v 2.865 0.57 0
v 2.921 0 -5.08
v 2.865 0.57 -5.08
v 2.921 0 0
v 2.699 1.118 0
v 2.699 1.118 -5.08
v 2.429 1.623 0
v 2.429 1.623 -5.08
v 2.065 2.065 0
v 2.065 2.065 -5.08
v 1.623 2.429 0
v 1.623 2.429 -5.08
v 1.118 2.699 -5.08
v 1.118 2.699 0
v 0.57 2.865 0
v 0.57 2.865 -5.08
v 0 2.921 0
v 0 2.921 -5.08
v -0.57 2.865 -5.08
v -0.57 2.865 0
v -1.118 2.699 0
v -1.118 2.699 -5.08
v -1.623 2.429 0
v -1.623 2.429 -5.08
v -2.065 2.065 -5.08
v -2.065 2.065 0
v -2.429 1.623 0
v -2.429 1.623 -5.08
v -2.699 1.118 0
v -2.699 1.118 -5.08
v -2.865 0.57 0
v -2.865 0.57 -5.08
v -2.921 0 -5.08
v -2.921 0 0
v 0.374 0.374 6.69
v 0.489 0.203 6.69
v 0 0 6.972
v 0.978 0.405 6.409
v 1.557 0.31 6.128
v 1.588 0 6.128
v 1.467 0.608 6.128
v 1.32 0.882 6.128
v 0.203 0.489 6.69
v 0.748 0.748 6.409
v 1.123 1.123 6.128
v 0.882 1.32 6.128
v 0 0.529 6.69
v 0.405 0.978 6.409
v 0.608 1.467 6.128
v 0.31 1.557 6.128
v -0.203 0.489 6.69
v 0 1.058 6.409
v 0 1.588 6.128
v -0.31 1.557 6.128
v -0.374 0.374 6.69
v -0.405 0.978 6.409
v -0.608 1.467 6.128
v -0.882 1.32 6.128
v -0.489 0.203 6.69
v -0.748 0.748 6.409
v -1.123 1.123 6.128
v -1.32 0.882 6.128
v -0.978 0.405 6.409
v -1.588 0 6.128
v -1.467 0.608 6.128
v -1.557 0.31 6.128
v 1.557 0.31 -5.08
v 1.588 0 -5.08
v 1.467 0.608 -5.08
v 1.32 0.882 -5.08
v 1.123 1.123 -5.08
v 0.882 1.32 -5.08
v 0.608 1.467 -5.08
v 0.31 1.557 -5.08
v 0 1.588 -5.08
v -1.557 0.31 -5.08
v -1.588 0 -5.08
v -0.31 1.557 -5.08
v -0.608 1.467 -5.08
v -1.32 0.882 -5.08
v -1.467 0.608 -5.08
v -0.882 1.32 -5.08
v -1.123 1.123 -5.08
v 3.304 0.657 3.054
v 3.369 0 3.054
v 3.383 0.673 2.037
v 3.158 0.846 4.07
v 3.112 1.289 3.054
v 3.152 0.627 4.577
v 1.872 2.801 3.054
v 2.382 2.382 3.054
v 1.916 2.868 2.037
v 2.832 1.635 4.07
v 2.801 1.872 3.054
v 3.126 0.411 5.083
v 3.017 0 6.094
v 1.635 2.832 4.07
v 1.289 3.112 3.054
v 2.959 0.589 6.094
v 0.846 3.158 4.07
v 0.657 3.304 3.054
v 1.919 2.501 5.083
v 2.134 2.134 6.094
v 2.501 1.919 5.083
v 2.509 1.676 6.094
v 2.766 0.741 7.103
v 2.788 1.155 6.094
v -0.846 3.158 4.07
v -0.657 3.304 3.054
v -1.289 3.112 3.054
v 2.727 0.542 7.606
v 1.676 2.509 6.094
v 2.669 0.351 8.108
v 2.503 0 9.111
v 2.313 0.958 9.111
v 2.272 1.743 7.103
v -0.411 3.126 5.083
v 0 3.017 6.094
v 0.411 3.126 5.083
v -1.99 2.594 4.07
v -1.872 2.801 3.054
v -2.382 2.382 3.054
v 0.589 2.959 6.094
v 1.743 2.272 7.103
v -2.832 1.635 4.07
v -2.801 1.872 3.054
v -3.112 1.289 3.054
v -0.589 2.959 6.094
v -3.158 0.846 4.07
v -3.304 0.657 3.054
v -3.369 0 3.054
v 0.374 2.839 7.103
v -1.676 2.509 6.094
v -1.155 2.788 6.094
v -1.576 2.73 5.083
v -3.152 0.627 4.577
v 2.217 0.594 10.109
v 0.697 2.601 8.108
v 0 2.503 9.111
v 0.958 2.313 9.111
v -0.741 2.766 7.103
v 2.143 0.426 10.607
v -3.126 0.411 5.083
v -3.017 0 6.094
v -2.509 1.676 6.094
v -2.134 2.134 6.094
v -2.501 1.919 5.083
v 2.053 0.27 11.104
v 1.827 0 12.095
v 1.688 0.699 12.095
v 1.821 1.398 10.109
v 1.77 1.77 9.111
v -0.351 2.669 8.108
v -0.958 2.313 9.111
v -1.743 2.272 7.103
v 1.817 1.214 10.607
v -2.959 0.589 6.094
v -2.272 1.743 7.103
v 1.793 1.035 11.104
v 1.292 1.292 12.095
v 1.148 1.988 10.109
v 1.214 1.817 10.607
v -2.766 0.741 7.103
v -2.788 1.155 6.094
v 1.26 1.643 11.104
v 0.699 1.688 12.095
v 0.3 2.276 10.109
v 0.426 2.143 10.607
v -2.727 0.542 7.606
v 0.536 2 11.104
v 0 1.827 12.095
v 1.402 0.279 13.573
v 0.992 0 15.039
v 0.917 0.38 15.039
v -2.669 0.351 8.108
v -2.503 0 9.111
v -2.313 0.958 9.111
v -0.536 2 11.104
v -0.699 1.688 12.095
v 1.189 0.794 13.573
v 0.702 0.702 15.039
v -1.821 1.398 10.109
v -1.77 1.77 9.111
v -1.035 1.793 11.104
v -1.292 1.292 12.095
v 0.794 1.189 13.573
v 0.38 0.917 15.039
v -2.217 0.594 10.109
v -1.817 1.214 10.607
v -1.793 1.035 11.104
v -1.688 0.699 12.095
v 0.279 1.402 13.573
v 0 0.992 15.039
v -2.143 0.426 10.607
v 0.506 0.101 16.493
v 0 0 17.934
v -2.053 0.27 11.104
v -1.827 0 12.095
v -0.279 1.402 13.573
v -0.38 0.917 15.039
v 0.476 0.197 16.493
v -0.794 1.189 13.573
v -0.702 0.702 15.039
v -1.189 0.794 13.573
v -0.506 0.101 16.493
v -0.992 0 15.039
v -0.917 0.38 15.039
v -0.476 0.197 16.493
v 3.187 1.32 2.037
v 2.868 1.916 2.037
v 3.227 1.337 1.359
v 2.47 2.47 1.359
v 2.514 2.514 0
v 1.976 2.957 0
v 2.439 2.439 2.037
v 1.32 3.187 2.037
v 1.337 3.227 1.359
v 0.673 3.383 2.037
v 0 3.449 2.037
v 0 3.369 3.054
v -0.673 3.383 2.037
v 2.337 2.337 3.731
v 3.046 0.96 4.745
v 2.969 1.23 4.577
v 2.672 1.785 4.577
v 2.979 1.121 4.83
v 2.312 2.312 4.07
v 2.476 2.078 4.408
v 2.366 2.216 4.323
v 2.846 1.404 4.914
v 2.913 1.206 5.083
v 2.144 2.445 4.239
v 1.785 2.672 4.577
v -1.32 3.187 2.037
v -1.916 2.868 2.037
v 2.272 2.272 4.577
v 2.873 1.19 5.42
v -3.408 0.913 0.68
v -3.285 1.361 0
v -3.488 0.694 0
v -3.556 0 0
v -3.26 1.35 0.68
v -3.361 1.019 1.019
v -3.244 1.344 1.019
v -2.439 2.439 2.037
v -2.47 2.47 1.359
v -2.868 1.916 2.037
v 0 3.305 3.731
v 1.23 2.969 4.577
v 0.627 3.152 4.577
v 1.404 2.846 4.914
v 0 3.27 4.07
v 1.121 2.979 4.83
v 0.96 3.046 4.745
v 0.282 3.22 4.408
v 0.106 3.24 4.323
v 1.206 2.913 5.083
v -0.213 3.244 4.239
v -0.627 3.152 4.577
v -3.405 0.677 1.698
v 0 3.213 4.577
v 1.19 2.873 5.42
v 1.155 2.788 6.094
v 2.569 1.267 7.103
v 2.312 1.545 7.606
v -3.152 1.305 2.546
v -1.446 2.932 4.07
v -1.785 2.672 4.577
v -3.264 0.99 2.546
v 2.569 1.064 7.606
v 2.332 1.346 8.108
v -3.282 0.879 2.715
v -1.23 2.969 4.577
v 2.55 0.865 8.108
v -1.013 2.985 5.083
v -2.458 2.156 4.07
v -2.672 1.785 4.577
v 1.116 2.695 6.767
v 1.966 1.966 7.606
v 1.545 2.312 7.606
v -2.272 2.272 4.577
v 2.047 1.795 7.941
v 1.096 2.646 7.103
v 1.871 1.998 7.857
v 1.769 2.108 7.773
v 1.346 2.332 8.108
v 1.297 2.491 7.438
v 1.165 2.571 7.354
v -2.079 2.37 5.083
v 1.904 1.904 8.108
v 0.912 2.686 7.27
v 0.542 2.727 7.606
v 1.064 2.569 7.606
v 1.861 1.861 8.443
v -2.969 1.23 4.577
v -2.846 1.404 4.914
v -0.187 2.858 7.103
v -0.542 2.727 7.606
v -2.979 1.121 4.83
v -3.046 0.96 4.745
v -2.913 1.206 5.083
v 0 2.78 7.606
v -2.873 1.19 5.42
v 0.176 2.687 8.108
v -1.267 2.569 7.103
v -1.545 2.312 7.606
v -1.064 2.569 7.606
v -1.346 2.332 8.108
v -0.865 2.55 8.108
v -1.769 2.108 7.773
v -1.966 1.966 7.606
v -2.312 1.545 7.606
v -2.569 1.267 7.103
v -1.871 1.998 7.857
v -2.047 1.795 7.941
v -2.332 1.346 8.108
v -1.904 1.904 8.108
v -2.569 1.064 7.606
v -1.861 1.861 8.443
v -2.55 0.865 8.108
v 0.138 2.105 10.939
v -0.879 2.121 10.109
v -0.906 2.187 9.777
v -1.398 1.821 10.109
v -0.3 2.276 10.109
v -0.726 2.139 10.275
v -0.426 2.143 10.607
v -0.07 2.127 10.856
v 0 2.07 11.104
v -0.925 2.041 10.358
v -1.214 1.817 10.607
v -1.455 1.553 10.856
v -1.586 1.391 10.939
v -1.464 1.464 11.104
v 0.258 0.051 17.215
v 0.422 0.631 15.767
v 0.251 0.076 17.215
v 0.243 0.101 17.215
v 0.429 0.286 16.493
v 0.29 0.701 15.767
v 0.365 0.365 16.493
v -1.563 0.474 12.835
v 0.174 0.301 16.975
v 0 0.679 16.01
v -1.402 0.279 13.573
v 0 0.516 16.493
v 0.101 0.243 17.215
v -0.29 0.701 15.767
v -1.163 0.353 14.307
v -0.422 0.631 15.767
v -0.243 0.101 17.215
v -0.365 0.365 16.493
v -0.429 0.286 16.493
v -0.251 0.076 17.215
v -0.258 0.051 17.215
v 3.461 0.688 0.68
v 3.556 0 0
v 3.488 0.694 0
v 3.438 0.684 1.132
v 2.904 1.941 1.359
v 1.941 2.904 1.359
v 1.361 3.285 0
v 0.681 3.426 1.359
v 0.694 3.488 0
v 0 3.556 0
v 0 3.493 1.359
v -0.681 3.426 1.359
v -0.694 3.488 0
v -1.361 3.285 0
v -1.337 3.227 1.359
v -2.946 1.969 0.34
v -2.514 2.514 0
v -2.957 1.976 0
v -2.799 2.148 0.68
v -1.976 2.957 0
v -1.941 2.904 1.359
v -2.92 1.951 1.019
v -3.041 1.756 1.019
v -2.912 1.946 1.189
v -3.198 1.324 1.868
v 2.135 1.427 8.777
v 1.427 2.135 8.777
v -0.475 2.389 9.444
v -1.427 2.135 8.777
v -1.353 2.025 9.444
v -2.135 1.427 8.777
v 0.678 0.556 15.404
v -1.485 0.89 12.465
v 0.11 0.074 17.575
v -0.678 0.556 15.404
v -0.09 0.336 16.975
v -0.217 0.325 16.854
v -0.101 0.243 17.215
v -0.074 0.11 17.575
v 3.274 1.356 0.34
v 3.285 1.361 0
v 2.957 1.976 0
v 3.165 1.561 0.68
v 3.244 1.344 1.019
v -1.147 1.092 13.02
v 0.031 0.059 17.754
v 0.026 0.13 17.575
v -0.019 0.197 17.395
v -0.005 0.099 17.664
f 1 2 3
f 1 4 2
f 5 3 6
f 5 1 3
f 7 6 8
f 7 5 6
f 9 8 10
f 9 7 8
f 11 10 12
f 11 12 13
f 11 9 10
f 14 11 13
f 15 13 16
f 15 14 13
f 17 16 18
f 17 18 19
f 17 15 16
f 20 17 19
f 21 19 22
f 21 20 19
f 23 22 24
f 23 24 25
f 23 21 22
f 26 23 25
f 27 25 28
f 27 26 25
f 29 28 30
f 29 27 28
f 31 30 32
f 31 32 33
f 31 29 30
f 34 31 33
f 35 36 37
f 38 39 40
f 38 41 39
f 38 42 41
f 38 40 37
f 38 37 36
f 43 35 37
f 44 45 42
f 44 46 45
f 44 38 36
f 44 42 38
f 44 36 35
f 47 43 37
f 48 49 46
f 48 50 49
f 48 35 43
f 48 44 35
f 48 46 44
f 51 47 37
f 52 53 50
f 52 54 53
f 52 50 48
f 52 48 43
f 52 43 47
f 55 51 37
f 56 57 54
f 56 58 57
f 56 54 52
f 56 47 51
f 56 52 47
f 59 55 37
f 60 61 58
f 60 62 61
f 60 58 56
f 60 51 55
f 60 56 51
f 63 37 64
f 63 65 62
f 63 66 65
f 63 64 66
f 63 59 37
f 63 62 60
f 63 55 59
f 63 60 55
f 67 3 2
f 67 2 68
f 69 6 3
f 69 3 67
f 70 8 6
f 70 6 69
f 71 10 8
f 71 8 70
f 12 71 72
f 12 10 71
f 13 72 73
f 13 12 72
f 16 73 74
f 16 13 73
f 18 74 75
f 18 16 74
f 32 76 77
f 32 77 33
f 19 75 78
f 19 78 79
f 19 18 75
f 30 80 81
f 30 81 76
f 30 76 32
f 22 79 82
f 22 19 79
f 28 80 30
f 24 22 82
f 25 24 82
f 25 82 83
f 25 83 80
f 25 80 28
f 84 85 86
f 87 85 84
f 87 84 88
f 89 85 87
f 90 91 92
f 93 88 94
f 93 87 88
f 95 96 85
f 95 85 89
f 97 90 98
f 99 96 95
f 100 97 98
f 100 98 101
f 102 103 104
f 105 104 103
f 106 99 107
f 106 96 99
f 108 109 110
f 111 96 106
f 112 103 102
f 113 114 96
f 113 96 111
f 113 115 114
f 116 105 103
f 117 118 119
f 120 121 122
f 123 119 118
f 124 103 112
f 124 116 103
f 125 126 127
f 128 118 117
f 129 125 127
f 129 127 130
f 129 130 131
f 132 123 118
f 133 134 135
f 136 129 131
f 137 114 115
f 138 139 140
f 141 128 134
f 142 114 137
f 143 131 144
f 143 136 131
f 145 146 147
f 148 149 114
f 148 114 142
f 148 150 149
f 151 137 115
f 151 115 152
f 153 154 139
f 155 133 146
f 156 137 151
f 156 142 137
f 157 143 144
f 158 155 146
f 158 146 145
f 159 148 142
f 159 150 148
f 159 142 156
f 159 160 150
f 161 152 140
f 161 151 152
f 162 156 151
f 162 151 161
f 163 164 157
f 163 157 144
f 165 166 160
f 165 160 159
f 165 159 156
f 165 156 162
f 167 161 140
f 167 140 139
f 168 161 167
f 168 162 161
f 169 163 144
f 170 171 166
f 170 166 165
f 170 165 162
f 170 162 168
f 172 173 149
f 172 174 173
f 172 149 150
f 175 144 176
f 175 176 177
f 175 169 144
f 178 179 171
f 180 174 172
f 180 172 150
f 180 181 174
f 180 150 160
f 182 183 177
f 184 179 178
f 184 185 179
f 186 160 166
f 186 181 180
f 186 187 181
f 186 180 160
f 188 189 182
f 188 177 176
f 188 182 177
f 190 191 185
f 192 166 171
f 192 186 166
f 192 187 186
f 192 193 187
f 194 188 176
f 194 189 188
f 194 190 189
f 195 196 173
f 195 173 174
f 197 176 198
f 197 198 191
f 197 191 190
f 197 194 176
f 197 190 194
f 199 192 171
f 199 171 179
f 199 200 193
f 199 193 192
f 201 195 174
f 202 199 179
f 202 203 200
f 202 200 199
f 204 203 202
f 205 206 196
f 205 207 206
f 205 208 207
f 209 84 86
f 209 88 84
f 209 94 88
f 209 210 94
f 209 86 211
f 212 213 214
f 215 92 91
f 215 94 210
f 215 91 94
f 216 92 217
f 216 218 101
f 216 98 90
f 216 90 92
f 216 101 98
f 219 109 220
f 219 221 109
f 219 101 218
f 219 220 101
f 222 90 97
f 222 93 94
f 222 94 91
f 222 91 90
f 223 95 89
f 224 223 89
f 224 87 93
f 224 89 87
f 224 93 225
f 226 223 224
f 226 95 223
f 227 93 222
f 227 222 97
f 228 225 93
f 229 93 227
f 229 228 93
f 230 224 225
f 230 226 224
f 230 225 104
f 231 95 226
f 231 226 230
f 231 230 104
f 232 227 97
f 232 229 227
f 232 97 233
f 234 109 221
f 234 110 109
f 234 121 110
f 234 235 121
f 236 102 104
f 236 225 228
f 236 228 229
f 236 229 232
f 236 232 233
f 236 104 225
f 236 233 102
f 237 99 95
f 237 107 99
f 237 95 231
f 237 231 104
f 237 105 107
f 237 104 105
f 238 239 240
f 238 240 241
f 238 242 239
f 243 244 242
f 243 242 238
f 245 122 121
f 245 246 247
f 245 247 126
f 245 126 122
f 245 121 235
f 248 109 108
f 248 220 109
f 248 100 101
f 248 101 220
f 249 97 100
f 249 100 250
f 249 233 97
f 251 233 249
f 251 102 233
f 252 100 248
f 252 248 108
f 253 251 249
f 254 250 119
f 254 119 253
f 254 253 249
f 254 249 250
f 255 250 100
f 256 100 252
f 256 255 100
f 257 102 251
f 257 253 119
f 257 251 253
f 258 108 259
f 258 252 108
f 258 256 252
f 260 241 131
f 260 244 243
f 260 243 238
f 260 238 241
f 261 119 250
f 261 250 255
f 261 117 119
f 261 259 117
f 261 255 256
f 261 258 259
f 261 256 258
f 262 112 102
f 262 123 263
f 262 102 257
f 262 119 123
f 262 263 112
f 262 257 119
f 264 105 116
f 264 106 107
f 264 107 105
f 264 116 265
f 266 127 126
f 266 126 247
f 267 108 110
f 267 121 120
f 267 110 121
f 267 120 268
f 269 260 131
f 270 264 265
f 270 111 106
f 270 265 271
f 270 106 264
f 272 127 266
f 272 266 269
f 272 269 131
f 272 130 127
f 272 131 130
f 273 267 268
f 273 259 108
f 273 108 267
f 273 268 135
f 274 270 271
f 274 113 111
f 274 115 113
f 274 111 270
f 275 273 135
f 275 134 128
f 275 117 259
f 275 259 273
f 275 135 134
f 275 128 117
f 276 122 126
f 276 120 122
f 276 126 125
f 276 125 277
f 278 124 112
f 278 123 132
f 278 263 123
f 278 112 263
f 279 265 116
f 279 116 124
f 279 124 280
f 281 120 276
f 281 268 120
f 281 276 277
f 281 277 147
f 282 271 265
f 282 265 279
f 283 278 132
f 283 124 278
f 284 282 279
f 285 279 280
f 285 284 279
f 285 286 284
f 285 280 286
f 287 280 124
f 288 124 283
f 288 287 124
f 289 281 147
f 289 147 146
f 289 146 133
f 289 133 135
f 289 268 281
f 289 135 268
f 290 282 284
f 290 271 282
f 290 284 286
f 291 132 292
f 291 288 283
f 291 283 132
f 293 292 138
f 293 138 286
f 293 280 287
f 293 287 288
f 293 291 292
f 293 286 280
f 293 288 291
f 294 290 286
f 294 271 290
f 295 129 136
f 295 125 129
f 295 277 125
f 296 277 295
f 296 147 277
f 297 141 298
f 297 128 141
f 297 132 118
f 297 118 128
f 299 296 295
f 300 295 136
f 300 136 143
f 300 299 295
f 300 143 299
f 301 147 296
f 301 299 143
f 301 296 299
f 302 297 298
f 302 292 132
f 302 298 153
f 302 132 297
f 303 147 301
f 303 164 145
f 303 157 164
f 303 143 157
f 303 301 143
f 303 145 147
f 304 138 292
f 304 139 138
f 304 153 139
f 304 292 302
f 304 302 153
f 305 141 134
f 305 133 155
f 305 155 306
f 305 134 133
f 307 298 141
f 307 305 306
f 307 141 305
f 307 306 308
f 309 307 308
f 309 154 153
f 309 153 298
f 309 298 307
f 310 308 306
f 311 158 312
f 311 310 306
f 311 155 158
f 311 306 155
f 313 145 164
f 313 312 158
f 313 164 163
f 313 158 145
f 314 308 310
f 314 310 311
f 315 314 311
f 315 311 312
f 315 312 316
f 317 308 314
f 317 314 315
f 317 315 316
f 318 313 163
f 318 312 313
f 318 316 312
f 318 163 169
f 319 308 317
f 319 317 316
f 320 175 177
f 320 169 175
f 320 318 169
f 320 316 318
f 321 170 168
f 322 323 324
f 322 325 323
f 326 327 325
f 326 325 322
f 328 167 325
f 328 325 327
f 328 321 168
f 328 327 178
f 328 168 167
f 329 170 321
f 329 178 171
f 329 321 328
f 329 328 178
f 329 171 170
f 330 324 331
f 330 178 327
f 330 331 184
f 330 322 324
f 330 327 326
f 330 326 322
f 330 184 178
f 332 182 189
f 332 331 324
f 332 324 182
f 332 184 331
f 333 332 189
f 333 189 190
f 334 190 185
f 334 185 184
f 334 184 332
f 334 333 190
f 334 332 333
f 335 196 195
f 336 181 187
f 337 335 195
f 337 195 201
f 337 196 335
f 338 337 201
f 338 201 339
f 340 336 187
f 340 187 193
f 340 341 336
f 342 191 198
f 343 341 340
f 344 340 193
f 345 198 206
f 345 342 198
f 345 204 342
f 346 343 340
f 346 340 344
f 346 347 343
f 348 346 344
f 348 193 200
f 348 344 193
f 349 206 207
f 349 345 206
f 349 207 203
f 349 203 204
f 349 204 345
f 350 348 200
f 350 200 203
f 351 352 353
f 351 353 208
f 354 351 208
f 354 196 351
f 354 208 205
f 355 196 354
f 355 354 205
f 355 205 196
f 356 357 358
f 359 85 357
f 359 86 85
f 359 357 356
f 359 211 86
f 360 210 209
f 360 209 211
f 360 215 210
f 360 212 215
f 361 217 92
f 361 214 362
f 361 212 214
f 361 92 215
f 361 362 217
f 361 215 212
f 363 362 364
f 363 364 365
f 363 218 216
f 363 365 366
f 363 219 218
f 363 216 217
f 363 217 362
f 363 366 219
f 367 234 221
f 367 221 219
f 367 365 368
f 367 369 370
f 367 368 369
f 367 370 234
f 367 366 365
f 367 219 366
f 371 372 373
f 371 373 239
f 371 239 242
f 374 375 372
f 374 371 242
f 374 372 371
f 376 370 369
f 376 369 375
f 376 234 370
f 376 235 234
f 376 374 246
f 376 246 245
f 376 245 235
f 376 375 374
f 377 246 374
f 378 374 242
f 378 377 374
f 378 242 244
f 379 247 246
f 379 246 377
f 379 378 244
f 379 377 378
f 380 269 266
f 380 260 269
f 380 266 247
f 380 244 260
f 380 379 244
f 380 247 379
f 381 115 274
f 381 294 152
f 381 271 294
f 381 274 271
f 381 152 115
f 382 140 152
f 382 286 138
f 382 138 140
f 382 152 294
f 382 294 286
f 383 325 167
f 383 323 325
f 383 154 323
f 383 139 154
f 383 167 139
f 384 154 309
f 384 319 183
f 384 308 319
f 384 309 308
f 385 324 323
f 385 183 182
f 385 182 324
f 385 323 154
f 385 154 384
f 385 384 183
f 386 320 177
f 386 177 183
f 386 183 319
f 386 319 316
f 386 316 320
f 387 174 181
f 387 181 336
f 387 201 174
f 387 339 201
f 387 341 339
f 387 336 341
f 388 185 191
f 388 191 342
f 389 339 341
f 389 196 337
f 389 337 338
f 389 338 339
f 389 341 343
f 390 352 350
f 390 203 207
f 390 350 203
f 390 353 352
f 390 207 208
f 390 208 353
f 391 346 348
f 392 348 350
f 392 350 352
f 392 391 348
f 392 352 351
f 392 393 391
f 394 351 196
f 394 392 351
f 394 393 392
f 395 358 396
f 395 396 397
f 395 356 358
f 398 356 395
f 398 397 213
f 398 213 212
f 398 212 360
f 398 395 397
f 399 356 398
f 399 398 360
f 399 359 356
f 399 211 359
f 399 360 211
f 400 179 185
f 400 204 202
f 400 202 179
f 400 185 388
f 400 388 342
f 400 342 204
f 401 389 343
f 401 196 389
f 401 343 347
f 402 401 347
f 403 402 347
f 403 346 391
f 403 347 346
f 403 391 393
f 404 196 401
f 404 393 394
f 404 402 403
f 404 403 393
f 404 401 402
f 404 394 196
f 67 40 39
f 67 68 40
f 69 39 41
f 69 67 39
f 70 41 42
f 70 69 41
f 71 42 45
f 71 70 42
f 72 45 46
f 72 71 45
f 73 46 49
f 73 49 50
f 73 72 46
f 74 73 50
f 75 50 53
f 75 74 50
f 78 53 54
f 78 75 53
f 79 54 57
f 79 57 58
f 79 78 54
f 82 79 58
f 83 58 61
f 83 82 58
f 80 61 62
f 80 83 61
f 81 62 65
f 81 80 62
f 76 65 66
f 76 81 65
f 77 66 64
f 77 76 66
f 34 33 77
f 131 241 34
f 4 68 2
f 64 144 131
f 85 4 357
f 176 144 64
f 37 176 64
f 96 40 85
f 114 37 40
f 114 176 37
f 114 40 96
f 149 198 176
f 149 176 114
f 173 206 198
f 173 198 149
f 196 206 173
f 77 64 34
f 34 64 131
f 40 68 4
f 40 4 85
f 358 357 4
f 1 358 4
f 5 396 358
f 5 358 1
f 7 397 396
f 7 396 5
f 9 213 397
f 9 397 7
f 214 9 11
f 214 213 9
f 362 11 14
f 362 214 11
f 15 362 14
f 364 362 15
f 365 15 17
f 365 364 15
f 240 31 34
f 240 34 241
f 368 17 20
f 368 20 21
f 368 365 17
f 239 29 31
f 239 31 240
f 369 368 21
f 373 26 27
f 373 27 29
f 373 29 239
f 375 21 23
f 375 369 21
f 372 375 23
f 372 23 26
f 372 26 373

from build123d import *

# Parameters (mm, degrees)
F1_ANGLE = 180


with BuildPart() as f1:
    # F0 (on Front) → F1 (revolve)
    with BuildSketch(Plane.XZ):
        with BuildLine():
            Line((2.921, -1.016), (2.921, 0))
            Line((2.921, 0), (3.556, 0))
            ThreePointArc((3.556, 0), (2.503044, 9.11053), (0, 17.933524))
            Line((0, 17.933524), (0, 6.971839))
            Line((0, 6.971839), (1.5875, 6.12775))
            Line((1.5875, 6.12775), (1.5875, -1.016))
            Line((1.5875, -1.016), (1.5875, -5.08))
            Line((1.5875, -5.08), (2.921, -5.08))
            Line((2.921, -5.08), (2.921, -1.016))
        make_face()
    revolve(axis=Axis((0, 0, 12.452682), (0, 0, 1)), revolution_arc=F1_ANGLE)


solid = f1.part
